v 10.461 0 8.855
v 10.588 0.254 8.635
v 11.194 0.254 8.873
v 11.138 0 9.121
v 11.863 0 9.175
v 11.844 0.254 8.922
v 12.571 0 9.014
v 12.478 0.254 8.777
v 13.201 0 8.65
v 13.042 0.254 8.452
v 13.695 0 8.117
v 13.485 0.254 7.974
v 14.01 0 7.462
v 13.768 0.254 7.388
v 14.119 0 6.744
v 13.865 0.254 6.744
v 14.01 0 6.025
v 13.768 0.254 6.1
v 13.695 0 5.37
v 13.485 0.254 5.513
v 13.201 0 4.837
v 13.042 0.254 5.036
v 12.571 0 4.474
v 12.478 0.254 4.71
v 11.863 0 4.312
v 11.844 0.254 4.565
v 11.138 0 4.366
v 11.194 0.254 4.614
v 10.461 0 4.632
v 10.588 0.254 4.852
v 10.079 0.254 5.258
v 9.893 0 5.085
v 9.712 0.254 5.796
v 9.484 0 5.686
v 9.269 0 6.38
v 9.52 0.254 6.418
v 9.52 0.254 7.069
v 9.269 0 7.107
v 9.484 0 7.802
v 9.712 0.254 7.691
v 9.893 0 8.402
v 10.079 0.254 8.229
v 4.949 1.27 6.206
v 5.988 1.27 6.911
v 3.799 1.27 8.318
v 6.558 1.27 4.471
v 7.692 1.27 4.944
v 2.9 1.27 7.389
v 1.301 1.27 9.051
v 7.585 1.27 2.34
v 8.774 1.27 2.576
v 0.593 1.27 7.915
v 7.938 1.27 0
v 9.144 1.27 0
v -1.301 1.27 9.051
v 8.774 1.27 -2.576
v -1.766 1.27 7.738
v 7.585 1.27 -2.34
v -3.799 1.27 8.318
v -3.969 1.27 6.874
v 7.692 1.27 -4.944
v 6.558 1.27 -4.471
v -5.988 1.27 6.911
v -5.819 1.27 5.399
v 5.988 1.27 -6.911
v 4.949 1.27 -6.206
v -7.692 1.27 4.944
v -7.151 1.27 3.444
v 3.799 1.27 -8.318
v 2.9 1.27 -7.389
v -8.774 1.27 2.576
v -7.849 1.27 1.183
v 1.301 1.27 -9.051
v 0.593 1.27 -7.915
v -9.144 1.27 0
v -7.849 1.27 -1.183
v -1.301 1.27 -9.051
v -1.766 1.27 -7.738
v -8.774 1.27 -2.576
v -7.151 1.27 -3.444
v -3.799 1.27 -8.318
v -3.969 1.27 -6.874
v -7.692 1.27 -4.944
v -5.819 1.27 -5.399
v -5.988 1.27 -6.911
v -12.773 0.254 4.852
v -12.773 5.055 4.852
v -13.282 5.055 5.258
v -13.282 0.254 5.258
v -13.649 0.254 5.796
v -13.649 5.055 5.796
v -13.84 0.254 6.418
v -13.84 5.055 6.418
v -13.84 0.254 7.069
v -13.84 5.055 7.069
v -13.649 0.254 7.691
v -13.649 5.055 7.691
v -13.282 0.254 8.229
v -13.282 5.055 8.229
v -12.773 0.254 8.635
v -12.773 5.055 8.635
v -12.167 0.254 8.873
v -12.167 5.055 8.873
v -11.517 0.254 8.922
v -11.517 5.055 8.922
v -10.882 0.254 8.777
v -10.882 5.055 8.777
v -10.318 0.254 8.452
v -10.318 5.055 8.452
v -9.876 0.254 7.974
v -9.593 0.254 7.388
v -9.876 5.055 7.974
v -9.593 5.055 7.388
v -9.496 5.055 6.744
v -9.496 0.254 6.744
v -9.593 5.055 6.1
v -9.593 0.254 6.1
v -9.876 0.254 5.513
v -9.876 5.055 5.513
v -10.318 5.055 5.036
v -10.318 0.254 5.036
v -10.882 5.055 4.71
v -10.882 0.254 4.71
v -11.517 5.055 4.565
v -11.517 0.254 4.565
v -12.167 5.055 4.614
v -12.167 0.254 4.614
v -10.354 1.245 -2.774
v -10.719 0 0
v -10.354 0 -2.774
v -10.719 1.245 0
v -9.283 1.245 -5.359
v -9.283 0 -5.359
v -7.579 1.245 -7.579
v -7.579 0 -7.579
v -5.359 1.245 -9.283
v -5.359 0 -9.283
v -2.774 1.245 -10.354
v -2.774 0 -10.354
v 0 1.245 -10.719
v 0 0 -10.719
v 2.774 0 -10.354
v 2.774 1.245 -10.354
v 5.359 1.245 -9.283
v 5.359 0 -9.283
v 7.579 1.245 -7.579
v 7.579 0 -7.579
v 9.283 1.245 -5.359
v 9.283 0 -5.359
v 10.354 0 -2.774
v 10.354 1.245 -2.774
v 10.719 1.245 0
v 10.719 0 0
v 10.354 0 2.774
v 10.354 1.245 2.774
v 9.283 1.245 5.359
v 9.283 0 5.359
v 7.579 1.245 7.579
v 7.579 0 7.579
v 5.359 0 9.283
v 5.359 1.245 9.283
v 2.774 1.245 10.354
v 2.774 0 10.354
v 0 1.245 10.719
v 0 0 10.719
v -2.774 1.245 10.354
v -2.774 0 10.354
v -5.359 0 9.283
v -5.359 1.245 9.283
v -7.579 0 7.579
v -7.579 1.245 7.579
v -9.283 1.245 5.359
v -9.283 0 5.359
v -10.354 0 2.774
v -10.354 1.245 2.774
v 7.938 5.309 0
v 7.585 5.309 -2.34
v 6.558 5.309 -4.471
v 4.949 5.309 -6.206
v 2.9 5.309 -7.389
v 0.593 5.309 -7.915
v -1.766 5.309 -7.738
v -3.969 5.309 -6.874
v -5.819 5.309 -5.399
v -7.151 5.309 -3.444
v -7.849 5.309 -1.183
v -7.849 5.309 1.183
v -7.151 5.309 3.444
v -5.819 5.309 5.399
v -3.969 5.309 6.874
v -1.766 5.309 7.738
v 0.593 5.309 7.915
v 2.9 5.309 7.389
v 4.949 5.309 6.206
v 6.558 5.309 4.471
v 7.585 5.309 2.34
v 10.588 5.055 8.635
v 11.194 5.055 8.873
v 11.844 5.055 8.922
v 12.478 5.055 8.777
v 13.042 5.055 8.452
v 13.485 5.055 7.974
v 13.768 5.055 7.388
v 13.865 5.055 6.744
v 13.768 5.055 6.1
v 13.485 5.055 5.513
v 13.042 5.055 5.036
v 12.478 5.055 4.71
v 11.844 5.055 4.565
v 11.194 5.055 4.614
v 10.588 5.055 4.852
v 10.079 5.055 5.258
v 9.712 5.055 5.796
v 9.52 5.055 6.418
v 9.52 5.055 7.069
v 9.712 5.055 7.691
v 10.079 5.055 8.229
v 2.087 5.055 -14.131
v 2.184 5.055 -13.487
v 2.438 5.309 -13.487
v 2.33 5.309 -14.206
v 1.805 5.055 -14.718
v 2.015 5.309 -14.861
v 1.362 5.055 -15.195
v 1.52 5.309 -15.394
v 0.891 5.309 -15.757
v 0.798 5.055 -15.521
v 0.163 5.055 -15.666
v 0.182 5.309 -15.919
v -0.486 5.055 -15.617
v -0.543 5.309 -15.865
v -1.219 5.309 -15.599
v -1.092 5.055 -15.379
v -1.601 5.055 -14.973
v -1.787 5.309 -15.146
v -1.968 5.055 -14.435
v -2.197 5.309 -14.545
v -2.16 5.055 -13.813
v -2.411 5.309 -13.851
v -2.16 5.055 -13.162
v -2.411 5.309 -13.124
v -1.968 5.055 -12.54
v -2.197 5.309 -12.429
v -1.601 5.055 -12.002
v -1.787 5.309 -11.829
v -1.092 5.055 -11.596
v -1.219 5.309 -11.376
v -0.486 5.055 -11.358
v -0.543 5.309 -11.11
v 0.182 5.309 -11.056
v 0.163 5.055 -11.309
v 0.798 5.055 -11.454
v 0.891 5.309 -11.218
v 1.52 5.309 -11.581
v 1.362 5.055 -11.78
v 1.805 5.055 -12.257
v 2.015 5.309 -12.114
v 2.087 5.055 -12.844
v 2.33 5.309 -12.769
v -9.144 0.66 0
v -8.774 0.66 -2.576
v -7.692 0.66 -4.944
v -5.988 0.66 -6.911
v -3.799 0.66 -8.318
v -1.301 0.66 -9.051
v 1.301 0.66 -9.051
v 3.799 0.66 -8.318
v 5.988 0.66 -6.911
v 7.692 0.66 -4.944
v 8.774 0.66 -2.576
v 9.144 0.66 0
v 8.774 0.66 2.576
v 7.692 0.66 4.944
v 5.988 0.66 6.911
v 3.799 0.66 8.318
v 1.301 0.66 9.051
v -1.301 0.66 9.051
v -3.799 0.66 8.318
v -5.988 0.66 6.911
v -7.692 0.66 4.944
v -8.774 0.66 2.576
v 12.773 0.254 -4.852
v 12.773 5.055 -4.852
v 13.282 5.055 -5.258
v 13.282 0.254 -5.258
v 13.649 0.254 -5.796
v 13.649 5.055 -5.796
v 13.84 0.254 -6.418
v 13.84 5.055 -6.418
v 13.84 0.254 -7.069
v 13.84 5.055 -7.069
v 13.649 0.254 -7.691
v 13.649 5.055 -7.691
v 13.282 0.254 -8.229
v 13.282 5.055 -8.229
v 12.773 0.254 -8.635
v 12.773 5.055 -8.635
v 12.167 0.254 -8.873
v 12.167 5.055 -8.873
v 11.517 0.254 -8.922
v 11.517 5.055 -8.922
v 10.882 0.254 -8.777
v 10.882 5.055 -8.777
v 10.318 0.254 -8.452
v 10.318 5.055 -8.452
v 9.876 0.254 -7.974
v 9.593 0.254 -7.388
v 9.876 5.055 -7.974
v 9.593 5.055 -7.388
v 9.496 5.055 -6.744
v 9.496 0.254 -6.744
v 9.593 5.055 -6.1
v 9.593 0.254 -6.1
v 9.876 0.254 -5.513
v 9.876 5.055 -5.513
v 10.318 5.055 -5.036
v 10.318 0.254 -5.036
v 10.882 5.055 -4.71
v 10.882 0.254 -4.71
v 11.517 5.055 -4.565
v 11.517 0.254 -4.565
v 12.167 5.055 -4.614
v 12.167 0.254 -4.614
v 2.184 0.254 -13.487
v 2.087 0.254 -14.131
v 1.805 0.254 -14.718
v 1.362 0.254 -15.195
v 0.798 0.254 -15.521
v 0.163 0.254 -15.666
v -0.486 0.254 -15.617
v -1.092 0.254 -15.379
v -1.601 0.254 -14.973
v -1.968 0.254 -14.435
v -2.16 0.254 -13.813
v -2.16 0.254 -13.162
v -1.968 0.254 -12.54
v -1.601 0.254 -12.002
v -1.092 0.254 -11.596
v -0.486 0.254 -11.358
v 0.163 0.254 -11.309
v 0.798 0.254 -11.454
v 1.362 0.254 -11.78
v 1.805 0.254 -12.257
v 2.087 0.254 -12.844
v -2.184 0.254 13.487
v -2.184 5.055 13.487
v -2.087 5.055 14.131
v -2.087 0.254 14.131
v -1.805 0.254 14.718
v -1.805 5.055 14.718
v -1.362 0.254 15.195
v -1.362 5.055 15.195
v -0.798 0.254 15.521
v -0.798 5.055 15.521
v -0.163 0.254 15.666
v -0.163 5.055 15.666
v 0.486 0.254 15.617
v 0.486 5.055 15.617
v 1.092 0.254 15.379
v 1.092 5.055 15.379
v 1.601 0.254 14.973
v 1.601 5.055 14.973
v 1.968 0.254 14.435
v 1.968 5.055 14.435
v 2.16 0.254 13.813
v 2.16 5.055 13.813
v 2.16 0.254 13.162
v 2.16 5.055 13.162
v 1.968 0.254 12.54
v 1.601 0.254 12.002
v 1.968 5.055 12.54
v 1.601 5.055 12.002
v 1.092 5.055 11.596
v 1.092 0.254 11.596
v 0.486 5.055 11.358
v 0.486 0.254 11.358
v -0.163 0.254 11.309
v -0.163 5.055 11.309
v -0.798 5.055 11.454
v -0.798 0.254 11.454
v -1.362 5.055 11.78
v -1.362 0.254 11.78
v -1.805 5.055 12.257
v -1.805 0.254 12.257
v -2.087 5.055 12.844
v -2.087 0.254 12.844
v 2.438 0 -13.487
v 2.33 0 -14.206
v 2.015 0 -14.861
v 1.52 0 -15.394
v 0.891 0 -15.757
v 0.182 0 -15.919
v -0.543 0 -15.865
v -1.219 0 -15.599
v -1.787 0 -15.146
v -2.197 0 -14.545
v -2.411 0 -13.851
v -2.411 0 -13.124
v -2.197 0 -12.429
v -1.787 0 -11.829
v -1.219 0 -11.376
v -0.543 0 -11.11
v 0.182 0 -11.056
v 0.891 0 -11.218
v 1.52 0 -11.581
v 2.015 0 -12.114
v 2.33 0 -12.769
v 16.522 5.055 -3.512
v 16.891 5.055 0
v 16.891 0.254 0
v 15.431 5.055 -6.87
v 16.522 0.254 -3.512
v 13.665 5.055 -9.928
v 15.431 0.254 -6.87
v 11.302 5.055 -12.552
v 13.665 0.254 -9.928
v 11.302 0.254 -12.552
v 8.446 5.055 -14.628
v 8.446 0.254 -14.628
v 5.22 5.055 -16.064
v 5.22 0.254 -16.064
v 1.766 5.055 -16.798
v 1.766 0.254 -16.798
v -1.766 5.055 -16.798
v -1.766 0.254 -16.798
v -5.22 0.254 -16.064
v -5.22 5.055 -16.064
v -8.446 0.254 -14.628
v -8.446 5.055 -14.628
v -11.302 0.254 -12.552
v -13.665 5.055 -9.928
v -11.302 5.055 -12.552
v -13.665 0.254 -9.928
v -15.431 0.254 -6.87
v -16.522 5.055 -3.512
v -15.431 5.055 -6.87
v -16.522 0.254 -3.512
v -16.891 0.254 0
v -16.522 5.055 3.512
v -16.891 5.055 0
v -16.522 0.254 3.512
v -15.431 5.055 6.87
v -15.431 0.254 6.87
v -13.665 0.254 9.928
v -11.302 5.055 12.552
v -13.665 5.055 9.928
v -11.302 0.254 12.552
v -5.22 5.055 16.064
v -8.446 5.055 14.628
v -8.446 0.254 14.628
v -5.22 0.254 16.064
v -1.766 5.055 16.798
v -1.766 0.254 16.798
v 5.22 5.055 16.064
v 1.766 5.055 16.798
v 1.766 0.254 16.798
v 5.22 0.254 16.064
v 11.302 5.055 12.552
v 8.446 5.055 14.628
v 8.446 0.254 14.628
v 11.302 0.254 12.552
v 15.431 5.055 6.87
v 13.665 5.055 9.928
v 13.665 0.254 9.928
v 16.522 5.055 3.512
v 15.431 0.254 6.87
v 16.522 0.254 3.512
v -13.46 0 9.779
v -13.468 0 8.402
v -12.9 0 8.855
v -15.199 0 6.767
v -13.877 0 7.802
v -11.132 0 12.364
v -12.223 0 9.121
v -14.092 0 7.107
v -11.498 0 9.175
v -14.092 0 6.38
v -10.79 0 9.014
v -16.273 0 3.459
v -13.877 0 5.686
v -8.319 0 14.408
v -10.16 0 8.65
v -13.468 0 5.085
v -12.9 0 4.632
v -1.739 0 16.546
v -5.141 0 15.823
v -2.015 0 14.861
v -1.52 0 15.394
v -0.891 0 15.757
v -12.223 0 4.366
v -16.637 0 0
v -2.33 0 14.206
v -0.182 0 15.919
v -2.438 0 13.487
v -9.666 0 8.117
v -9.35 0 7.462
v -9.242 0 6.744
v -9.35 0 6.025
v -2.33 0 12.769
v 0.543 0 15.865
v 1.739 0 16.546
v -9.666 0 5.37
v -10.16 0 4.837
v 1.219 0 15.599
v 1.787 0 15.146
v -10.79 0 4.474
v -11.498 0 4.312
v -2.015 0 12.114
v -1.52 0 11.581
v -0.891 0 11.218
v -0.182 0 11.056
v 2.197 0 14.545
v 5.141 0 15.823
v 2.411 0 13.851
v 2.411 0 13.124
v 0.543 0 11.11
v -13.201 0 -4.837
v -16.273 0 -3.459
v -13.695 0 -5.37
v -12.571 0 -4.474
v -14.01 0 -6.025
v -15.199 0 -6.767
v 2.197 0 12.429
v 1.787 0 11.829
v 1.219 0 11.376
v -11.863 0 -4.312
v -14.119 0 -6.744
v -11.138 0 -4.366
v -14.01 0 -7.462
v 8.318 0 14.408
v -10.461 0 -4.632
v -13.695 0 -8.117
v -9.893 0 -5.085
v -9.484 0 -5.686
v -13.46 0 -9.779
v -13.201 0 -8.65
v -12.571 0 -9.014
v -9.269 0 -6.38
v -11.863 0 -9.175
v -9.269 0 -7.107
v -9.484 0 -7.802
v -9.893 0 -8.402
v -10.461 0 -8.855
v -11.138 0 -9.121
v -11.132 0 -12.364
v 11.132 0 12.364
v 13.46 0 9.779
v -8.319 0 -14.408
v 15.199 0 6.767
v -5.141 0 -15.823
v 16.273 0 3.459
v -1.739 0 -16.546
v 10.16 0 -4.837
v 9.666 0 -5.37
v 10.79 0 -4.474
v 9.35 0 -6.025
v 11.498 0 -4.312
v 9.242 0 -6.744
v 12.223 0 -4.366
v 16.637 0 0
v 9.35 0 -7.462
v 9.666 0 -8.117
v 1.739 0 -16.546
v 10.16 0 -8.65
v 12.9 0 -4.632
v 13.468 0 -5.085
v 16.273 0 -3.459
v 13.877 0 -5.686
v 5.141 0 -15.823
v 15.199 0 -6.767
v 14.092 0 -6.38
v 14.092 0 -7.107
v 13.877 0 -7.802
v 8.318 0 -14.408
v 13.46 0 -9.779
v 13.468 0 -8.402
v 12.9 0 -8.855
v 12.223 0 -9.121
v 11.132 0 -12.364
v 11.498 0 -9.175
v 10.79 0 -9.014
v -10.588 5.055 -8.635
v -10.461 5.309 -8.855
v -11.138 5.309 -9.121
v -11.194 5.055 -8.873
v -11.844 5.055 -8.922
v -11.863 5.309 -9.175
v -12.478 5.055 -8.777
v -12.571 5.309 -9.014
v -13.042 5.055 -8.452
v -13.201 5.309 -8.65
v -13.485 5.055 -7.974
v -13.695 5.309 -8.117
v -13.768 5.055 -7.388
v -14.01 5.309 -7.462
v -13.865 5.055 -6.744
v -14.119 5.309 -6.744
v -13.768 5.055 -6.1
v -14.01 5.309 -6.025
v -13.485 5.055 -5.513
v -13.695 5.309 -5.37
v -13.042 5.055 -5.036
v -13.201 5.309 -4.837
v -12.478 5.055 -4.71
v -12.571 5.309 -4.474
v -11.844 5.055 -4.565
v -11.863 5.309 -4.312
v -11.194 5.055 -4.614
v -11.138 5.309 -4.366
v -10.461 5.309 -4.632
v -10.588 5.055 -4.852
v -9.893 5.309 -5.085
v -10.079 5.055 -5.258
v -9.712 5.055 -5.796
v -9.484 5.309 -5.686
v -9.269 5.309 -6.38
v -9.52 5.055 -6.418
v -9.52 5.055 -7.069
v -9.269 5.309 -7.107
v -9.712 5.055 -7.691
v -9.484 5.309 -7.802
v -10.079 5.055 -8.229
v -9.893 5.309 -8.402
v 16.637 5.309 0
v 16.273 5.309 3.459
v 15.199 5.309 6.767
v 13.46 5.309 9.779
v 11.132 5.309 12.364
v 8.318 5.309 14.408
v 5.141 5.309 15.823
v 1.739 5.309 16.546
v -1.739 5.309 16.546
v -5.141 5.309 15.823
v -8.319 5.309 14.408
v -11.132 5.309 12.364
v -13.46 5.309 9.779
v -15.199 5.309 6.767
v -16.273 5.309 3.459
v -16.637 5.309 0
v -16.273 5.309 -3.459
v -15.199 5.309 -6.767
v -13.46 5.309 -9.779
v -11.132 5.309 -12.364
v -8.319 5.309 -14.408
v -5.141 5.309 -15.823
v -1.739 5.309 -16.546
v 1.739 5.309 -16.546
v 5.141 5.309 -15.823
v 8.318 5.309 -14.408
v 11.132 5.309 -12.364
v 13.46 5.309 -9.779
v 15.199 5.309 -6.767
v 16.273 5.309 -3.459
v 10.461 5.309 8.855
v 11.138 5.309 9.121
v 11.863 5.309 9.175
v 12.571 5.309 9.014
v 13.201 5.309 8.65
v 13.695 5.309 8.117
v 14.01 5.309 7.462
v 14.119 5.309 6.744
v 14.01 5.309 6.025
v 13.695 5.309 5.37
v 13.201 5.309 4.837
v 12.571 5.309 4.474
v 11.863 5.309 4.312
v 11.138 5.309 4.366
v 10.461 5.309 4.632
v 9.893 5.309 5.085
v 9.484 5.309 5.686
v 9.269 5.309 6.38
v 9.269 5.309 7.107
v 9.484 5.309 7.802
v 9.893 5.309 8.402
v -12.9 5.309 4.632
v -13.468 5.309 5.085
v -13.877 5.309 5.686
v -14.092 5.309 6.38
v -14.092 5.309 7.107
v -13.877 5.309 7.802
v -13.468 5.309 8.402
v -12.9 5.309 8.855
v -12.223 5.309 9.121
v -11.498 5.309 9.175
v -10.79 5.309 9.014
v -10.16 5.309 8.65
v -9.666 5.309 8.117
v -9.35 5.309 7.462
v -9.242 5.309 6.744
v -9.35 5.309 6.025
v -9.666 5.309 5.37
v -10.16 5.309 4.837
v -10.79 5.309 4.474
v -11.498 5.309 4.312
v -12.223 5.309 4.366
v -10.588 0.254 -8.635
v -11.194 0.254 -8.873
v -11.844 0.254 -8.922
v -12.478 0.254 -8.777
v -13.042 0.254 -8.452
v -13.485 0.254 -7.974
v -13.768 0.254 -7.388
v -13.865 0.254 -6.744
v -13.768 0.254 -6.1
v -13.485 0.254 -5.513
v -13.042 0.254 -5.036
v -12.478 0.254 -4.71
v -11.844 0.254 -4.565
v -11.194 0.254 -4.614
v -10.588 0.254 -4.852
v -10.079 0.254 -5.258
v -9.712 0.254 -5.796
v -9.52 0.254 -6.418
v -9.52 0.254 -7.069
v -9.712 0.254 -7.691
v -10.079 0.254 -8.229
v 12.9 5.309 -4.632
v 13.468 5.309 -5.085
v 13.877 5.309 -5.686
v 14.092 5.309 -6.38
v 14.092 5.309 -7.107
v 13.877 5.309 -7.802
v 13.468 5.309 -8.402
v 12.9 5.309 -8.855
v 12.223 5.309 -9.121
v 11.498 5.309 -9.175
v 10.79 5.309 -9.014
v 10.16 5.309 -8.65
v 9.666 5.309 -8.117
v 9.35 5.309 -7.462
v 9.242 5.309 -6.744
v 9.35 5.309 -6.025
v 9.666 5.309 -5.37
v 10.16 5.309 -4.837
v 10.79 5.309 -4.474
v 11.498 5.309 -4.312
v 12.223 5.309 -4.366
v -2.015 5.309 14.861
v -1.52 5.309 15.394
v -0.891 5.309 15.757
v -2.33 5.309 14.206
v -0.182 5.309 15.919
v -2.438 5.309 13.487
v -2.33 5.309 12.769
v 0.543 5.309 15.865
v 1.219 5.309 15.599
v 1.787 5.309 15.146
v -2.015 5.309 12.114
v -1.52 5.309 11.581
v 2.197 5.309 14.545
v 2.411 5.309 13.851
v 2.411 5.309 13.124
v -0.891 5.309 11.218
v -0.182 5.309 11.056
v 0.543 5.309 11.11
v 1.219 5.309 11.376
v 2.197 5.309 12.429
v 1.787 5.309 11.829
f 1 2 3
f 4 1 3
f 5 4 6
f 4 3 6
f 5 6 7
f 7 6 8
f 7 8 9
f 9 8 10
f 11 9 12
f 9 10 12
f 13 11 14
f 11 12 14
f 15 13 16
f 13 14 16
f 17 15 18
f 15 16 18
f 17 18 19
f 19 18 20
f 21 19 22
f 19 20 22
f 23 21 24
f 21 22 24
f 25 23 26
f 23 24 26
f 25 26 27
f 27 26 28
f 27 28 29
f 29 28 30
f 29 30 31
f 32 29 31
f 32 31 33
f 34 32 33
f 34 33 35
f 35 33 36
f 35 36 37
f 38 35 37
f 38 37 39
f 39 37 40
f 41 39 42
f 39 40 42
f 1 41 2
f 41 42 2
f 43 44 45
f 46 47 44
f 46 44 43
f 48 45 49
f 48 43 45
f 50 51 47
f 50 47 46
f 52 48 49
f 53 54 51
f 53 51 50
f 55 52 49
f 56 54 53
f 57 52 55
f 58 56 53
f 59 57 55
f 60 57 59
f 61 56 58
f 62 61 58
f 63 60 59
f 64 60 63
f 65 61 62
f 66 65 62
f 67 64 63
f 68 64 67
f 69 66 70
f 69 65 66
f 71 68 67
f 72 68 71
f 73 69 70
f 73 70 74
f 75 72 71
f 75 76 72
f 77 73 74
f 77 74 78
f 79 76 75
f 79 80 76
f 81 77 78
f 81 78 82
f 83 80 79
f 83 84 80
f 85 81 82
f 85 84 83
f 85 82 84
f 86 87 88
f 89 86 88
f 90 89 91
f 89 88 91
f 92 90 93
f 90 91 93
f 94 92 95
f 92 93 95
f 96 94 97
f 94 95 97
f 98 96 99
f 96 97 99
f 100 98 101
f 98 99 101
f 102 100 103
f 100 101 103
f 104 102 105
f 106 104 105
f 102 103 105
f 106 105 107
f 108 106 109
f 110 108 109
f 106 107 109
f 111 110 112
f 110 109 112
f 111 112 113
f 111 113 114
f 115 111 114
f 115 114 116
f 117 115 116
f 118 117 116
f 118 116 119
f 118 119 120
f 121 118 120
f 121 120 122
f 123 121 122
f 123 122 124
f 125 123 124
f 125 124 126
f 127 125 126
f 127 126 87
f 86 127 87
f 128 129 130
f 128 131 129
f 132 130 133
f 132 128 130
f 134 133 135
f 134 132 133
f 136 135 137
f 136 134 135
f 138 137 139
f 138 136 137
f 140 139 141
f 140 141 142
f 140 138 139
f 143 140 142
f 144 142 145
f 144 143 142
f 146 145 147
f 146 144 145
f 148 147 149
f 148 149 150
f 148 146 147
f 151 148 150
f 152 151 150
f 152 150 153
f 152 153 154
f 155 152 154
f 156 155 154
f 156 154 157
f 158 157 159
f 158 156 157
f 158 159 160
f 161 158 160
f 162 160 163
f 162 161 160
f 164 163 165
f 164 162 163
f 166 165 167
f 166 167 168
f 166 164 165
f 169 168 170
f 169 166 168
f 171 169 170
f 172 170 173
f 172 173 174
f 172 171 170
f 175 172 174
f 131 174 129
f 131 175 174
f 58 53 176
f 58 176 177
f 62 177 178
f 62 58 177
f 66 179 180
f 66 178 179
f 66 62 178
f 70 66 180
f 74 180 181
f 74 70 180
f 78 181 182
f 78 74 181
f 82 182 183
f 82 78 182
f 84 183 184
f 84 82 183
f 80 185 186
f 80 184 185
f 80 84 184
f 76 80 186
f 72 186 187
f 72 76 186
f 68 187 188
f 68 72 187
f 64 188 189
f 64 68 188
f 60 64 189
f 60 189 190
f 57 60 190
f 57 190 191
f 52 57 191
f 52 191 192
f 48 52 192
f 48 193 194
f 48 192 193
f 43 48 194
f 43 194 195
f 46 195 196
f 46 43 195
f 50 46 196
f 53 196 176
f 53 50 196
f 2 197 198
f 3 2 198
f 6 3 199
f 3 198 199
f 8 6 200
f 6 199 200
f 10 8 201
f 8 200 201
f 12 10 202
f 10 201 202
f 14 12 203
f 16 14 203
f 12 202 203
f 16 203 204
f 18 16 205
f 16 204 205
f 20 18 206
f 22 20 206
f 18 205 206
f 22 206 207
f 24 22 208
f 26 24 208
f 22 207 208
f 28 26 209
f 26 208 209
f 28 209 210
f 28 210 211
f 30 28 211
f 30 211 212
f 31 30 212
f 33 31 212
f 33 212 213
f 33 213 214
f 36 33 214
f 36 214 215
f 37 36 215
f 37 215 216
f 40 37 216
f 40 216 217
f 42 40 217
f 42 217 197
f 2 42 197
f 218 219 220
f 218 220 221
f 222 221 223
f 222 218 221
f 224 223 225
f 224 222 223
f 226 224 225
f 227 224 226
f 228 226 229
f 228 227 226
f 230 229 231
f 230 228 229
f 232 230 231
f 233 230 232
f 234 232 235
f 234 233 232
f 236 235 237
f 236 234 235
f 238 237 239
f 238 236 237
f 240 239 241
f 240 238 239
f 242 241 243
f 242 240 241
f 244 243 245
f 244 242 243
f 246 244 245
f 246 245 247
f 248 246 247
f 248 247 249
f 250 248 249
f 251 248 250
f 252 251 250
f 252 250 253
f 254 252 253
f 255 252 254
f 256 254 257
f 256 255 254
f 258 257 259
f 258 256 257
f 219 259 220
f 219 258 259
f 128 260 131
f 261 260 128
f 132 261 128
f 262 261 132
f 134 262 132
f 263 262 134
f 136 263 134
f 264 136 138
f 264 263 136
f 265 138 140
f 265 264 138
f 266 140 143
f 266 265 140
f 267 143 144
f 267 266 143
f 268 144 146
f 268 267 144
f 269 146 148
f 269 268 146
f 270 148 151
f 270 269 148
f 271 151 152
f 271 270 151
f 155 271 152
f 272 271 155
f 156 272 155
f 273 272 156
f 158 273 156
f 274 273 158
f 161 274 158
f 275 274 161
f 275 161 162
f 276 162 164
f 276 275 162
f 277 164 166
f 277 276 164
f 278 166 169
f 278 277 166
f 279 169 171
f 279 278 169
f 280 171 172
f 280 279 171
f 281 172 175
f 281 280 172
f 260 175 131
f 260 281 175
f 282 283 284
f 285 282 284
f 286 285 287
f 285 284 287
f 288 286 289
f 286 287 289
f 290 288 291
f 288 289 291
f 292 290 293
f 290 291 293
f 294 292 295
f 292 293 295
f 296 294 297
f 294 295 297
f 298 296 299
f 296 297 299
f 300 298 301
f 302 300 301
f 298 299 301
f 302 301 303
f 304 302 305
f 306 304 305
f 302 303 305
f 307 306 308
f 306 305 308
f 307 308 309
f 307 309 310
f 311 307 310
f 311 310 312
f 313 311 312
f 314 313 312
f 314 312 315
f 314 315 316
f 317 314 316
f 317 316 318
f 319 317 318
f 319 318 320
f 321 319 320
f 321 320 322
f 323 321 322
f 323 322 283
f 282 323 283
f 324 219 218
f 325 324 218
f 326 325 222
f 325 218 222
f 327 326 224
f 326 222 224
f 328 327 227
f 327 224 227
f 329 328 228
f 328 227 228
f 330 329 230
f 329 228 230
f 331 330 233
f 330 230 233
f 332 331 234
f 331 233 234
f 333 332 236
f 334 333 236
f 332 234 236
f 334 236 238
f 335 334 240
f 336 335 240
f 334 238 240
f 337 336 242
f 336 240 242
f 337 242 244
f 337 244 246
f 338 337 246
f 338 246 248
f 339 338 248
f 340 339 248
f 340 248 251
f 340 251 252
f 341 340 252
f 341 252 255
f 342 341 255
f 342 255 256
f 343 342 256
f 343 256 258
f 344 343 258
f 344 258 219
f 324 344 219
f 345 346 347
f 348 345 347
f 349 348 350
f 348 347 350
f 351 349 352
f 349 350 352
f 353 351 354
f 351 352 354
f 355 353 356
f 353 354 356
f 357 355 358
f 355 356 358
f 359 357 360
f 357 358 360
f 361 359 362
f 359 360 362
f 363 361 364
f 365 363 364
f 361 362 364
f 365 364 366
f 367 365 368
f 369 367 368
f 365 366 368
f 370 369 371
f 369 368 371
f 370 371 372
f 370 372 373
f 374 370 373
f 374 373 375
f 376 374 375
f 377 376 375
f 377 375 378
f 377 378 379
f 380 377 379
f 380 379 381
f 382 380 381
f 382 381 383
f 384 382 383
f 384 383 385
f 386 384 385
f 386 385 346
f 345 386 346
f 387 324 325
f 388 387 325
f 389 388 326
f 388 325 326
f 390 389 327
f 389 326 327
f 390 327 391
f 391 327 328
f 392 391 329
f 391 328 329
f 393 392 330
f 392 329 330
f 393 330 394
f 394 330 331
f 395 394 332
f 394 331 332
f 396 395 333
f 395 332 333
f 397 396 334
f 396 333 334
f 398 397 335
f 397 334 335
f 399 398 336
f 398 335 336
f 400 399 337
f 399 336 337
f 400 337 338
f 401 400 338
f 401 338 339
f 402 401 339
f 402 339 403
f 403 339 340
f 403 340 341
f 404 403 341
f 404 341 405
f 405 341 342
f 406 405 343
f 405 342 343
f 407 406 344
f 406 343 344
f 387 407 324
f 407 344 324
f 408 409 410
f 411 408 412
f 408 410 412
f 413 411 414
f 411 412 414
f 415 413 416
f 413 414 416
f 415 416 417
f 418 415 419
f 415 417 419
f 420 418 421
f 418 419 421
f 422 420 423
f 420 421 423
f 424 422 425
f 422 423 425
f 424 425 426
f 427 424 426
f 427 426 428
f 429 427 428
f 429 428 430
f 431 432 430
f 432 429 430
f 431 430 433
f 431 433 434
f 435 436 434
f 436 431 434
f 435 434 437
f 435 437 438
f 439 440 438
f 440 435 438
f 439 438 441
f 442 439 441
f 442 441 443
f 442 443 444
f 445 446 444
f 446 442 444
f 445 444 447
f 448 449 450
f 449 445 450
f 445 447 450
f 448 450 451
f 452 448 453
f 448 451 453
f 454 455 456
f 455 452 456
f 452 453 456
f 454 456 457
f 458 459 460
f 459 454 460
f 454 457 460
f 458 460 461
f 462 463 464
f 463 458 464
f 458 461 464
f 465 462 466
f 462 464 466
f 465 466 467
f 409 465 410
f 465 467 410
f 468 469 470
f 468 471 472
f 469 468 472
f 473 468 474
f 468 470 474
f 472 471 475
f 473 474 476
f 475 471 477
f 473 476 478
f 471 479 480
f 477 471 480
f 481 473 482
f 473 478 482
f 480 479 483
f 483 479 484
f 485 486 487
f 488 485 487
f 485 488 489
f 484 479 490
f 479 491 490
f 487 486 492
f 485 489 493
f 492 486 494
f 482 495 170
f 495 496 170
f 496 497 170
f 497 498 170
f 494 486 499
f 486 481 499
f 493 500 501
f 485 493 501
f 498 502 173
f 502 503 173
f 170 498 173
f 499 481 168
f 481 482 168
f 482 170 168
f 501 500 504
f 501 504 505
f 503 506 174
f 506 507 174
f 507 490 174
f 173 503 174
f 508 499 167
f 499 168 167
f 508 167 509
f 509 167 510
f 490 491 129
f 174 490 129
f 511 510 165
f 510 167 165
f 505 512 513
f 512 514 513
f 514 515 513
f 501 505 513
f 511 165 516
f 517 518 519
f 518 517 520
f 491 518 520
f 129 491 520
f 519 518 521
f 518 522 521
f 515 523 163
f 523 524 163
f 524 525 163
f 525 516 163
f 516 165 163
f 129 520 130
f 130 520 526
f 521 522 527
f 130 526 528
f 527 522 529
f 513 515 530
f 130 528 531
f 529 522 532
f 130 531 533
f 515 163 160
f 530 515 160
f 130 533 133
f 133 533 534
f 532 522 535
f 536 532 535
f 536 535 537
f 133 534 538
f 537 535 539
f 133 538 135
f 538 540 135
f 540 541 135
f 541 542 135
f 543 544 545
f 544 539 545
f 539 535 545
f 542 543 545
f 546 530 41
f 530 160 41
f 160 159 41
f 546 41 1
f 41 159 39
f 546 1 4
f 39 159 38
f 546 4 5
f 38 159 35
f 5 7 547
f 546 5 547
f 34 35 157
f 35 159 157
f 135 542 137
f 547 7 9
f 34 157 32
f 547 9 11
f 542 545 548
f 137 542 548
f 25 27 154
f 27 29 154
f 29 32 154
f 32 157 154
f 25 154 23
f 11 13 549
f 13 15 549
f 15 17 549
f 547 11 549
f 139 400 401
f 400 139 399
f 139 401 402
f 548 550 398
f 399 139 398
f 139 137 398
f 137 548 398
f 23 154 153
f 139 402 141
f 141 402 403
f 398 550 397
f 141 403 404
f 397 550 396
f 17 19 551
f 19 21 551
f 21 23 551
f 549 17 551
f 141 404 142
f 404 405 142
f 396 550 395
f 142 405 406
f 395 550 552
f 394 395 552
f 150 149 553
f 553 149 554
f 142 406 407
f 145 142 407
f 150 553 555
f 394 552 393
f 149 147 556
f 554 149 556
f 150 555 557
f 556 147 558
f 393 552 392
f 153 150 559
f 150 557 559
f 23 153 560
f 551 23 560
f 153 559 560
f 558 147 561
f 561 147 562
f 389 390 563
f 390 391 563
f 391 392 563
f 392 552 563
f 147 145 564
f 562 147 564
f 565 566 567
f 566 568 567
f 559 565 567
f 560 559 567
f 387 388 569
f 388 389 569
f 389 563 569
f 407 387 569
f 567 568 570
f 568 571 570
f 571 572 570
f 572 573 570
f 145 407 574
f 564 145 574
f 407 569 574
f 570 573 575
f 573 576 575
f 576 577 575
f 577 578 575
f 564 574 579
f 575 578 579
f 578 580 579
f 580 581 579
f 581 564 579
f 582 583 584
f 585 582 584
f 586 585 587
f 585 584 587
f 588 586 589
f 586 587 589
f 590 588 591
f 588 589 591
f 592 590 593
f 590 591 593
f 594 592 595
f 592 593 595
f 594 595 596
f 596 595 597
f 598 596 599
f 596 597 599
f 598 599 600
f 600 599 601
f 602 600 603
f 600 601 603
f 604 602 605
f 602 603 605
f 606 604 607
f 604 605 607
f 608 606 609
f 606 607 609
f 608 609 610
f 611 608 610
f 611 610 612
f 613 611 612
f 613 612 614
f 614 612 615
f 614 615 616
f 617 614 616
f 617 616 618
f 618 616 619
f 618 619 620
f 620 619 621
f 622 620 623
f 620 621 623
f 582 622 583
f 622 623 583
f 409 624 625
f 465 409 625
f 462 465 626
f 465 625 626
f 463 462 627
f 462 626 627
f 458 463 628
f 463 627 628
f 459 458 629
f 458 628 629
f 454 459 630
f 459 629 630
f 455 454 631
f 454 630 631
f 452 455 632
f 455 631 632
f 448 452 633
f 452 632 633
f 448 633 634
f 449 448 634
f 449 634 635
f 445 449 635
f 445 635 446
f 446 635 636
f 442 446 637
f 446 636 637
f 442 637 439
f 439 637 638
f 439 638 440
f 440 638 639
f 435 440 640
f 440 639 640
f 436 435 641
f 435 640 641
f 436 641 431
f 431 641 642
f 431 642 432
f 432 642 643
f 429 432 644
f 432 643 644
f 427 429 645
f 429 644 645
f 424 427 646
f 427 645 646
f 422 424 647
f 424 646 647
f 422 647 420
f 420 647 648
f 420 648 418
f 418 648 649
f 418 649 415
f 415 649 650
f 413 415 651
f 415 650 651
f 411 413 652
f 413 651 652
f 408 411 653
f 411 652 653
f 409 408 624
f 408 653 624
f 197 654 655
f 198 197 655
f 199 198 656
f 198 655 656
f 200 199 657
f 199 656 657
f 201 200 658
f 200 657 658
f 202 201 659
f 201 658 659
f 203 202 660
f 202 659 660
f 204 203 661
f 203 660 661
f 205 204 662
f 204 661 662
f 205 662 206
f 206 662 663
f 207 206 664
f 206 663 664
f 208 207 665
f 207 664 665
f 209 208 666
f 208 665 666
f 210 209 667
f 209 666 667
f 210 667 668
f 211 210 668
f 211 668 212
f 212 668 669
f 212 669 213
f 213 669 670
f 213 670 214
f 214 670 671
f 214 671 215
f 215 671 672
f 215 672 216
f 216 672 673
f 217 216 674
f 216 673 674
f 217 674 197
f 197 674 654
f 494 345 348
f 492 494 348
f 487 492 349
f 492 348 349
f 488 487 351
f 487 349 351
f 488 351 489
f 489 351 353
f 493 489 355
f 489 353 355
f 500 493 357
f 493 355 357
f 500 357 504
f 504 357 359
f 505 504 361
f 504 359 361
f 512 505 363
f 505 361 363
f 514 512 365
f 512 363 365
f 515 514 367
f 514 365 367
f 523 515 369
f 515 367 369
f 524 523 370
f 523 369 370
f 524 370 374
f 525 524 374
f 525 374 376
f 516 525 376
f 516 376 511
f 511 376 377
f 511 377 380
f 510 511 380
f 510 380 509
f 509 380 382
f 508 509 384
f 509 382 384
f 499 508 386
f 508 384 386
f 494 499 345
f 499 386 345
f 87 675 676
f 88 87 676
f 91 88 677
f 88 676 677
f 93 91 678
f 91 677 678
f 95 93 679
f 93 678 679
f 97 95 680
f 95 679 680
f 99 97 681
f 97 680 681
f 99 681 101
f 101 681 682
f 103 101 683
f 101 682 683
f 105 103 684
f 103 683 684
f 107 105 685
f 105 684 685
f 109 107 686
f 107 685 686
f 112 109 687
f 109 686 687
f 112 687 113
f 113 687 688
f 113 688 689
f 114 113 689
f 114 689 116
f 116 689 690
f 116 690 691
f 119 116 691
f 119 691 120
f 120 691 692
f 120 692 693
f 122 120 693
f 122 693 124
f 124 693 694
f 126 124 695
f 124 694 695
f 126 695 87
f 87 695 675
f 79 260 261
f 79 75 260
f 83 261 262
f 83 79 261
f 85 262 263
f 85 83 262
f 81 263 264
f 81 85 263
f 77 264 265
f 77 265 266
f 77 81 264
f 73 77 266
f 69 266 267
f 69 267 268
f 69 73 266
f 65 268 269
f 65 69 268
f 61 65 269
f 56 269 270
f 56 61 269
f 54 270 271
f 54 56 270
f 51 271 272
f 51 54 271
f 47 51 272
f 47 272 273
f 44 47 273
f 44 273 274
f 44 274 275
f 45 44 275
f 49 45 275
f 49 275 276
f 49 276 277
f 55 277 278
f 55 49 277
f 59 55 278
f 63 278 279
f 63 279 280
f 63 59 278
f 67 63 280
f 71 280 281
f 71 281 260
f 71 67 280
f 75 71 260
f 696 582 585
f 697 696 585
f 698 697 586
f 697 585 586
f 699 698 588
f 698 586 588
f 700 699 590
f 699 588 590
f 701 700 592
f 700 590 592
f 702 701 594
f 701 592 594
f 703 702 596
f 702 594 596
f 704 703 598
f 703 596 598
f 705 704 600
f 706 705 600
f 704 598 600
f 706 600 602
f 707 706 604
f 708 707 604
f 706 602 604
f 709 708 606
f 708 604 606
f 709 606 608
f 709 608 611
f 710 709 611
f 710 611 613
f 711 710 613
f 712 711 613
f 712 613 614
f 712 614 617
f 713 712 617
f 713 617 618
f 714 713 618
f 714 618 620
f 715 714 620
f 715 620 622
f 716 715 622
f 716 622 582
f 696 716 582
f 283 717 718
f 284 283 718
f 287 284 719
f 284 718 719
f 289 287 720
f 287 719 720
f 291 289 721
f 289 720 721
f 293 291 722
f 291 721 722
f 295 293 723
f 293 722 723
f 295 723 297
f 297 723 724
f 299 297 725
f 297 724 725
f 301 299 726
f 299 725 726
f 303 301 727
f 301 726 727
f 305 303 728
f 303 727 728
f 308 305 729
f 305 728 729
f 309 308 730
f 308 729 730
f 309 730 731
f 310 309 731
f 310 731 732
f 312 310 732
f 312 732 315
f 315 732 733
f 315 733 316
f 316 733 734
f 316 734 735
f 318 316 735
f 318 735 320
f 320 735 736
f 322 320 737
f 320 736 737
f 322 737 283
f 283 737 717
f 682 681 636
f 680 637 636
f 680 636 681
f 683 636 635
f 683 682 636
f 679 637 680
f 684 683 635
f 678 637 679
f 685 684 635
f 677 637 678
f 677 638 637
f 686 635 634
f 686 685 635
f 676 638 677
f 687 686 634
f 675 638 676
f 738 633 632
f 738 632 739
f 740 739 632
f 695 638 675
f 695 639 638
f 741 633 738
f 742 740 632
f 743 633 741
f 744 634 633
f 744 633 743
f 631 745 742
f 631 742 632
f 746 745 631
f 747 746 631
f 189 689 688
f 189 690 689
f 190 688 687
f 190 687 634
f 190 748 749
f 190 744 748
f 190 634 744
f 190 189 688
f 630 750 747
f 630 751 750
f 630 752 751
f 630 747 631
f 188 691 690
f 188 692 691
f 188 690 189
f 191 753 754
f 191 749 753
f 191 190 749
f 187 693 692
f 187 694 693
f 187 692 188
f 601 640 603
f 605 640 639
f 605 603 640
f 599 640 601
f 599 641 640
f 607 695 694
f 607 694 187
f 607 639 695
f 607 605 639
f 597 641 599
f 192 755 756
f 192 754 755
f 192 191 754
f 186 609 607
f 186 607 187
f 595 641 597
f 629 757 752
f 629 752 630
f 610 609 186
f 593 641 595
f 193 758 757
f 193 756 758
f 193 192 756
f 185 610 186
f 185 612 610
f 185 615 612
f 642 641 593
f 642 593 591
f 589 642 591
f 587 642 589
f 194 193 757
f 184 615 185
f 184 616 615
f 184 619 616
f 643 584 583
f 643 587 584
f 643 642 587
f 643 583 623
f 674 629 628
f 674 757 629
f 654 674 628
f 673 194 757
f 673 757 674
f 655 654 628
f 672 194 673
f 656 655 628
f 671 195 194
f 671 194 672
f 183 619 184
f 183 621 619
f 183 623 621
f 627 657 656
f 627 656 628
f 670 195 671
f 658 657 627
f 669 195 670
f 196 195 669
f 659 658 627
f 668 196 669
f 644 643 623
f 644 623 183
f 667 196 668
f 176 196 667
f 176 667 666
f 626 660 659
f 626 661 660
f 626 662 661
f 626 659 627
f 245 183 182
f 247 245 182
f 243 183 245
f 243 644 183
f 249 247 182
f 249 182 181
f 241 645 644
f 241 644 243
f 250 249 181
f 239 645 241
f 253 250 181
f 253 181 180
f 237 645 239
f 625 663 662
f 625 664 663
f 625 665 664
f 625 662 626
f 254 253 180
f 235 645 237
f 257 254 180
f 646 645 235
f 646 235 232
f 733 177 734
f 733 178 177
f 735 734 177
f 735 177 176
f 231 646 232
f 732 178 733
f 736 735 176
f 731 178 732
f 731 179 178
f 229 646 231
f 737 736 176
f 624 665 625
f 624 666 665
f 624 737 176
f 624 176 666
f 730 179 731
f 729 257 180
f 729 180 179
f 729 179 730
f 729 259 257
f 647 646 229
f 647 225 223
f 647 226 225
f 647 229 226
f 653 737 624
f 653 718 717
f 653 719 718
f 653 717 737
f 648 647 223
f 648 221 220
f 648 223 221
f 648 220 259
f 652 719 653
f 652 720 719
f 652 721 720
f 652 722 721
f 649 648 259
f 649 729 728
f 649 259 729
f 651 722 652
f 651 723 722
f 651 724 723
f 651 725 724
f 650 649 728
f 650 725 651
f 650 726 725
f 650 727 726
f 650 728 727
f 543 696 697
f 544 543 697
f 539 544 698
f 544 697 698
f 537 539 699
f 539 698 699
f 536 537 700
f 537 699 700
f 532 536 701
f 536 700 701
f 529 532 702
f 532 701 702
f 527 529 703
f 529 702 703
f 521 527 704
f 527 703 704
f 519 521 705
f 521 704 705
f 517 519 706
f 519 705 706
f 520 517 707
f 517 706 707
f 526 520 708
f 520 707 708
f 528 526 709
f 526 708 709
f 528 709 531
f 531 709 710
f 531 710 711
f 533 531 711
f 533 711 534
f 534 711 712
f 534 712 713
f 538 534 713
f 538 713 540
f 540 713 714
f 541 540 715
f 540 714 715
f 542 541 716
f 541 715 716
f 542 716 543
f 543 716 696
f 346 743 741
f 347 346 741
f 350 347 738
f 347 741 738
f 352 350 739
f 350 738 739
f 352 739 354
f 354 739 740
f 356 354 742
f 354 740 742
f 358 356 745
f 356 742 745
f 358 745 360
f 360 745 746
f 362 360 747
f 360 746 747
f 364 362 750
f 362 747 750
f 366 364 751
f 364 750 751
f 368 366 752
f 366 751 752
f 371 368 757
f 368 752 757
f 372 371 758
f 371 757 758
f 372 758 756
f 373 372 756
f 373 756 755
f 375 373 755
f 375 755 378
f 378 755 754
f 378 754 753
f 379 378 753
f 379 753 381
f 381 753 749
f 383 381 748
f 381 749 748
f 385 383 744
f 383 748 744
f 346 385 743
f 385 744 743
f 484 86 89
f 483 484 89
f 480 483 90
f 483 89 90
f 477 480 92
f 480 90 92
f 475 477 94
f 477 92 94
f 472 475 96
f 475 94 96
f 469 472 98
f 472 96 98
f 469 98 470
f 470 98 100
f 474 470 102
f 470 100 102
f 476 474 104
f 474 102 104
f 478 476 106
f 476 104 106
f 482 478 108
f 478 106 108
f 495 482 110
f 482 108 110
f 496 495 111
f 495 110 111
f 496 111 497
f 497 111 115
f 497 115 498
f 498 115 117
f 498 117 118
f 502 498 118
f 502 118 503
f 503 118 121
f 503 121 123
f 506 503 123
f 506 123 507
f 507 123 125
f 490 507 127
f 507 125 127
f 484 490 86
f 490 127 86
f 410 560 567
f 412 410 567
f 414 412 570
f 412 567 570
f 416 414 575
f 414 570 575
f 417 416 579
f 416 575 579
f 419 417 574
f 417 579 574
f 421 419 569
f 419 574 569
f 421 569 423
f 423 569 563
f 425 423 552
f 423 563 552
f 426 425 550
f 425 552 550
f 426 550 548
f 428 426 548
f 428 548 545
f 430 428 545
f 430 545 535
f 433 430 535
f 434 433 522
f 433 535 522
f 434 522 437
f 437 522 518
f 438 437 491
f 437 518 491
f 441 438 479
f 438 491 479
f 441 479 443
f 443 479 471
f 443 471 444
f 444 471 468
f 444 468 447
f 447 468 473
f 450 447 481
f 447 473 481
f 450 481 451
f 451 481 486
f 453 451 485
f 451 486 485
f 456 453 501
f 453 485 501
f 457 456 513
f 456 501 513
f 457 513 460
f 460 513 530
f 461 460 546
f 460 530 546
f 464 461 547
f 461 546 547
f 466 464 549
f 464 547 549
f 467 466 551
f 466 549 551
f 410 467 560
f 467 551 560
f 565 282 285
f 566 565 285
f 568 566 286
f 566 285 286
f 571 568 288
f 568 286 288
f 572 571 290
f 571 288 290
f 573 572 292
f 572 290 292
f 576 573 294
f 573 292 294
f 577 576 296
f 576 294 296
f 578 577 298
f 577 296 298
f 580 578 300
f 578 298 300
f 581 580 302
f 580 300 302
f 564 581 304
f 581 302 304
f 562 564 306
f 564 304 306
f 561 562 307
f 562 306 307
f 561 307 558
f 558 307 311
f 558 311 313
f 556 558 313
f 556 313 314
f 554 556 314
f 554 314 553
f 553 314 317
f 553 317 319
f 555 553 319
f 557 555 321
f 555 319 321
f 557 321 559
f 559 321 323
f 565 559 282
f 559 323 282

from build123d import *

# Parameters (mm, degrees)
SKETCH1_R                    = 16.891
SKETCH1_R_2                  = 7.9375
BOSS_EXTRUDE1_DEPTH          = 12.7
SKETCH2_R                    = 20.6375
CUT_EXTRUDE1_DEPTH           = 7.3914
CHAMFER1_SIZE                = 0.254
SKETCH4_R                    = 2.1844
CUT_EXTRUDE2_DEPTH           = 6.3086
CHAMFER2_SIZE                = 0.254
CIRPATTERN1_COUNT            = 6
CHAMFER2_OF_CIRPATTERN1_SIZE = 0.254


with BuildPart() as part:
    # Sketch1 → Boss-Extrude1 (new body)
    with BuildSketch(Plane(origin=(0, 0, 0), x_dir=(1, 0, 0), z_dir=(0, 1, 0))):
        Circle(SKETCH1_R)
        Circle(SKETCH1_R_2, mode=Mode.SUBTRACT)
    extrude(amount=BOSS_EXTRUDE1_DEPTH)

    # Sketch2 → Cut-Extrude1 (cut)
    with BuildSketch(Plane(origin=(0, 12.7, 0), x_dir=(1, 0, 0), z_dir=(0, 1, 0))):
        Circle(SKETCH2_R)
    extrude(amount=-CUT_EXTRUDE1_DEPTH, mode=Mode.SUBTRACT)

    # Chamfer1
    chamfer1_edges = [part.edges().sort_by_distance(p)[0] for p in [
        (-16.891, 5.3086, 0),
        (-16.891, 0, 0),
    ]]
    chamfer(chamfer1_edges, length=CHAMFER1_SIZE)

    # Sketch3 → Cut-Revolve1 (revolve, cut)
    with BuildSketch(Plane.XY):
        Polygon((-10.7188, 0), (-10.7188, 1.2446), (-9.144, 0.6604), (-9.144, 1.27), (0, 1.27), (0, 0), align=None)
    revolve(axis=Axis((0, 12.7, 0), (0, -1, 0)), mode=Mode.SUBTRACT)

    # Sketch4 → Cut-Extrude2 (cut, through all)
    with BuildSketch(Plane(origin=(0, 5.3086, 0), x_dir=(1, 0, 0), z_dir=(0, 1, 0))):
        with Locations((0, 13.4874)):
            Circle(SKETCH4_R)
    cut_extrude2 = extrude(amount=-CUT_EXTRUDE2_DEPTH, mode=Mode.SUBTRACT)

    # Chamfer2
    chamfer2_edges = [part.edges().sort_by_distance(p)[0] for p in [
        (-2.1844, 0, -13.4874),
        (-2.1844, 5.3086, -13.4874),
    ]]
    chamfer(chamfer2_edges, length=CHAMFER2_SIZE)

    # CirPattern1: Cut-Extrude2 ×6 about axis
    cirpattern1_axis = Axis((0, 0, 0), (0, 1, 0))
    for i in range(1, CIRPATTERN1_COUNT):
        add(cut_extrude2.rotate(cirpattern1_axis, i * 360 / CIRPATTERN1_COUNT), mode=Mode.SUBTRACT)

    # Chamfer2 of CirPattern1
    chamfer2_of_cirpattern1_edges = [part.edges().sort_by_distance(p)[0] for p in [
        (-12.772631031, 0, -4.851954108),
        (-12.772631031, 5.3086, -4.851954108),
        (-10.588231031, 0, 8.635445892),
        (-10.588231031, 5.3086, 8.635445892),
        (2.1844, 0, 13.4874),
        (2.1844, 5.3086, 13.4874),
        (12.772631031, 0, 4.851954108),
        (12.772631031, 5.3086, 4.851954108),
        (10.588231031, 0, -8.635445892),
        (10.588231031, 5.3086, -8.635445892),
    ]]
    chamfer(chamfer2_of_cirpattern1_edges, length=CHAMFER2_OF_CIRPATTERN1_SIZE)


solid = part.part
